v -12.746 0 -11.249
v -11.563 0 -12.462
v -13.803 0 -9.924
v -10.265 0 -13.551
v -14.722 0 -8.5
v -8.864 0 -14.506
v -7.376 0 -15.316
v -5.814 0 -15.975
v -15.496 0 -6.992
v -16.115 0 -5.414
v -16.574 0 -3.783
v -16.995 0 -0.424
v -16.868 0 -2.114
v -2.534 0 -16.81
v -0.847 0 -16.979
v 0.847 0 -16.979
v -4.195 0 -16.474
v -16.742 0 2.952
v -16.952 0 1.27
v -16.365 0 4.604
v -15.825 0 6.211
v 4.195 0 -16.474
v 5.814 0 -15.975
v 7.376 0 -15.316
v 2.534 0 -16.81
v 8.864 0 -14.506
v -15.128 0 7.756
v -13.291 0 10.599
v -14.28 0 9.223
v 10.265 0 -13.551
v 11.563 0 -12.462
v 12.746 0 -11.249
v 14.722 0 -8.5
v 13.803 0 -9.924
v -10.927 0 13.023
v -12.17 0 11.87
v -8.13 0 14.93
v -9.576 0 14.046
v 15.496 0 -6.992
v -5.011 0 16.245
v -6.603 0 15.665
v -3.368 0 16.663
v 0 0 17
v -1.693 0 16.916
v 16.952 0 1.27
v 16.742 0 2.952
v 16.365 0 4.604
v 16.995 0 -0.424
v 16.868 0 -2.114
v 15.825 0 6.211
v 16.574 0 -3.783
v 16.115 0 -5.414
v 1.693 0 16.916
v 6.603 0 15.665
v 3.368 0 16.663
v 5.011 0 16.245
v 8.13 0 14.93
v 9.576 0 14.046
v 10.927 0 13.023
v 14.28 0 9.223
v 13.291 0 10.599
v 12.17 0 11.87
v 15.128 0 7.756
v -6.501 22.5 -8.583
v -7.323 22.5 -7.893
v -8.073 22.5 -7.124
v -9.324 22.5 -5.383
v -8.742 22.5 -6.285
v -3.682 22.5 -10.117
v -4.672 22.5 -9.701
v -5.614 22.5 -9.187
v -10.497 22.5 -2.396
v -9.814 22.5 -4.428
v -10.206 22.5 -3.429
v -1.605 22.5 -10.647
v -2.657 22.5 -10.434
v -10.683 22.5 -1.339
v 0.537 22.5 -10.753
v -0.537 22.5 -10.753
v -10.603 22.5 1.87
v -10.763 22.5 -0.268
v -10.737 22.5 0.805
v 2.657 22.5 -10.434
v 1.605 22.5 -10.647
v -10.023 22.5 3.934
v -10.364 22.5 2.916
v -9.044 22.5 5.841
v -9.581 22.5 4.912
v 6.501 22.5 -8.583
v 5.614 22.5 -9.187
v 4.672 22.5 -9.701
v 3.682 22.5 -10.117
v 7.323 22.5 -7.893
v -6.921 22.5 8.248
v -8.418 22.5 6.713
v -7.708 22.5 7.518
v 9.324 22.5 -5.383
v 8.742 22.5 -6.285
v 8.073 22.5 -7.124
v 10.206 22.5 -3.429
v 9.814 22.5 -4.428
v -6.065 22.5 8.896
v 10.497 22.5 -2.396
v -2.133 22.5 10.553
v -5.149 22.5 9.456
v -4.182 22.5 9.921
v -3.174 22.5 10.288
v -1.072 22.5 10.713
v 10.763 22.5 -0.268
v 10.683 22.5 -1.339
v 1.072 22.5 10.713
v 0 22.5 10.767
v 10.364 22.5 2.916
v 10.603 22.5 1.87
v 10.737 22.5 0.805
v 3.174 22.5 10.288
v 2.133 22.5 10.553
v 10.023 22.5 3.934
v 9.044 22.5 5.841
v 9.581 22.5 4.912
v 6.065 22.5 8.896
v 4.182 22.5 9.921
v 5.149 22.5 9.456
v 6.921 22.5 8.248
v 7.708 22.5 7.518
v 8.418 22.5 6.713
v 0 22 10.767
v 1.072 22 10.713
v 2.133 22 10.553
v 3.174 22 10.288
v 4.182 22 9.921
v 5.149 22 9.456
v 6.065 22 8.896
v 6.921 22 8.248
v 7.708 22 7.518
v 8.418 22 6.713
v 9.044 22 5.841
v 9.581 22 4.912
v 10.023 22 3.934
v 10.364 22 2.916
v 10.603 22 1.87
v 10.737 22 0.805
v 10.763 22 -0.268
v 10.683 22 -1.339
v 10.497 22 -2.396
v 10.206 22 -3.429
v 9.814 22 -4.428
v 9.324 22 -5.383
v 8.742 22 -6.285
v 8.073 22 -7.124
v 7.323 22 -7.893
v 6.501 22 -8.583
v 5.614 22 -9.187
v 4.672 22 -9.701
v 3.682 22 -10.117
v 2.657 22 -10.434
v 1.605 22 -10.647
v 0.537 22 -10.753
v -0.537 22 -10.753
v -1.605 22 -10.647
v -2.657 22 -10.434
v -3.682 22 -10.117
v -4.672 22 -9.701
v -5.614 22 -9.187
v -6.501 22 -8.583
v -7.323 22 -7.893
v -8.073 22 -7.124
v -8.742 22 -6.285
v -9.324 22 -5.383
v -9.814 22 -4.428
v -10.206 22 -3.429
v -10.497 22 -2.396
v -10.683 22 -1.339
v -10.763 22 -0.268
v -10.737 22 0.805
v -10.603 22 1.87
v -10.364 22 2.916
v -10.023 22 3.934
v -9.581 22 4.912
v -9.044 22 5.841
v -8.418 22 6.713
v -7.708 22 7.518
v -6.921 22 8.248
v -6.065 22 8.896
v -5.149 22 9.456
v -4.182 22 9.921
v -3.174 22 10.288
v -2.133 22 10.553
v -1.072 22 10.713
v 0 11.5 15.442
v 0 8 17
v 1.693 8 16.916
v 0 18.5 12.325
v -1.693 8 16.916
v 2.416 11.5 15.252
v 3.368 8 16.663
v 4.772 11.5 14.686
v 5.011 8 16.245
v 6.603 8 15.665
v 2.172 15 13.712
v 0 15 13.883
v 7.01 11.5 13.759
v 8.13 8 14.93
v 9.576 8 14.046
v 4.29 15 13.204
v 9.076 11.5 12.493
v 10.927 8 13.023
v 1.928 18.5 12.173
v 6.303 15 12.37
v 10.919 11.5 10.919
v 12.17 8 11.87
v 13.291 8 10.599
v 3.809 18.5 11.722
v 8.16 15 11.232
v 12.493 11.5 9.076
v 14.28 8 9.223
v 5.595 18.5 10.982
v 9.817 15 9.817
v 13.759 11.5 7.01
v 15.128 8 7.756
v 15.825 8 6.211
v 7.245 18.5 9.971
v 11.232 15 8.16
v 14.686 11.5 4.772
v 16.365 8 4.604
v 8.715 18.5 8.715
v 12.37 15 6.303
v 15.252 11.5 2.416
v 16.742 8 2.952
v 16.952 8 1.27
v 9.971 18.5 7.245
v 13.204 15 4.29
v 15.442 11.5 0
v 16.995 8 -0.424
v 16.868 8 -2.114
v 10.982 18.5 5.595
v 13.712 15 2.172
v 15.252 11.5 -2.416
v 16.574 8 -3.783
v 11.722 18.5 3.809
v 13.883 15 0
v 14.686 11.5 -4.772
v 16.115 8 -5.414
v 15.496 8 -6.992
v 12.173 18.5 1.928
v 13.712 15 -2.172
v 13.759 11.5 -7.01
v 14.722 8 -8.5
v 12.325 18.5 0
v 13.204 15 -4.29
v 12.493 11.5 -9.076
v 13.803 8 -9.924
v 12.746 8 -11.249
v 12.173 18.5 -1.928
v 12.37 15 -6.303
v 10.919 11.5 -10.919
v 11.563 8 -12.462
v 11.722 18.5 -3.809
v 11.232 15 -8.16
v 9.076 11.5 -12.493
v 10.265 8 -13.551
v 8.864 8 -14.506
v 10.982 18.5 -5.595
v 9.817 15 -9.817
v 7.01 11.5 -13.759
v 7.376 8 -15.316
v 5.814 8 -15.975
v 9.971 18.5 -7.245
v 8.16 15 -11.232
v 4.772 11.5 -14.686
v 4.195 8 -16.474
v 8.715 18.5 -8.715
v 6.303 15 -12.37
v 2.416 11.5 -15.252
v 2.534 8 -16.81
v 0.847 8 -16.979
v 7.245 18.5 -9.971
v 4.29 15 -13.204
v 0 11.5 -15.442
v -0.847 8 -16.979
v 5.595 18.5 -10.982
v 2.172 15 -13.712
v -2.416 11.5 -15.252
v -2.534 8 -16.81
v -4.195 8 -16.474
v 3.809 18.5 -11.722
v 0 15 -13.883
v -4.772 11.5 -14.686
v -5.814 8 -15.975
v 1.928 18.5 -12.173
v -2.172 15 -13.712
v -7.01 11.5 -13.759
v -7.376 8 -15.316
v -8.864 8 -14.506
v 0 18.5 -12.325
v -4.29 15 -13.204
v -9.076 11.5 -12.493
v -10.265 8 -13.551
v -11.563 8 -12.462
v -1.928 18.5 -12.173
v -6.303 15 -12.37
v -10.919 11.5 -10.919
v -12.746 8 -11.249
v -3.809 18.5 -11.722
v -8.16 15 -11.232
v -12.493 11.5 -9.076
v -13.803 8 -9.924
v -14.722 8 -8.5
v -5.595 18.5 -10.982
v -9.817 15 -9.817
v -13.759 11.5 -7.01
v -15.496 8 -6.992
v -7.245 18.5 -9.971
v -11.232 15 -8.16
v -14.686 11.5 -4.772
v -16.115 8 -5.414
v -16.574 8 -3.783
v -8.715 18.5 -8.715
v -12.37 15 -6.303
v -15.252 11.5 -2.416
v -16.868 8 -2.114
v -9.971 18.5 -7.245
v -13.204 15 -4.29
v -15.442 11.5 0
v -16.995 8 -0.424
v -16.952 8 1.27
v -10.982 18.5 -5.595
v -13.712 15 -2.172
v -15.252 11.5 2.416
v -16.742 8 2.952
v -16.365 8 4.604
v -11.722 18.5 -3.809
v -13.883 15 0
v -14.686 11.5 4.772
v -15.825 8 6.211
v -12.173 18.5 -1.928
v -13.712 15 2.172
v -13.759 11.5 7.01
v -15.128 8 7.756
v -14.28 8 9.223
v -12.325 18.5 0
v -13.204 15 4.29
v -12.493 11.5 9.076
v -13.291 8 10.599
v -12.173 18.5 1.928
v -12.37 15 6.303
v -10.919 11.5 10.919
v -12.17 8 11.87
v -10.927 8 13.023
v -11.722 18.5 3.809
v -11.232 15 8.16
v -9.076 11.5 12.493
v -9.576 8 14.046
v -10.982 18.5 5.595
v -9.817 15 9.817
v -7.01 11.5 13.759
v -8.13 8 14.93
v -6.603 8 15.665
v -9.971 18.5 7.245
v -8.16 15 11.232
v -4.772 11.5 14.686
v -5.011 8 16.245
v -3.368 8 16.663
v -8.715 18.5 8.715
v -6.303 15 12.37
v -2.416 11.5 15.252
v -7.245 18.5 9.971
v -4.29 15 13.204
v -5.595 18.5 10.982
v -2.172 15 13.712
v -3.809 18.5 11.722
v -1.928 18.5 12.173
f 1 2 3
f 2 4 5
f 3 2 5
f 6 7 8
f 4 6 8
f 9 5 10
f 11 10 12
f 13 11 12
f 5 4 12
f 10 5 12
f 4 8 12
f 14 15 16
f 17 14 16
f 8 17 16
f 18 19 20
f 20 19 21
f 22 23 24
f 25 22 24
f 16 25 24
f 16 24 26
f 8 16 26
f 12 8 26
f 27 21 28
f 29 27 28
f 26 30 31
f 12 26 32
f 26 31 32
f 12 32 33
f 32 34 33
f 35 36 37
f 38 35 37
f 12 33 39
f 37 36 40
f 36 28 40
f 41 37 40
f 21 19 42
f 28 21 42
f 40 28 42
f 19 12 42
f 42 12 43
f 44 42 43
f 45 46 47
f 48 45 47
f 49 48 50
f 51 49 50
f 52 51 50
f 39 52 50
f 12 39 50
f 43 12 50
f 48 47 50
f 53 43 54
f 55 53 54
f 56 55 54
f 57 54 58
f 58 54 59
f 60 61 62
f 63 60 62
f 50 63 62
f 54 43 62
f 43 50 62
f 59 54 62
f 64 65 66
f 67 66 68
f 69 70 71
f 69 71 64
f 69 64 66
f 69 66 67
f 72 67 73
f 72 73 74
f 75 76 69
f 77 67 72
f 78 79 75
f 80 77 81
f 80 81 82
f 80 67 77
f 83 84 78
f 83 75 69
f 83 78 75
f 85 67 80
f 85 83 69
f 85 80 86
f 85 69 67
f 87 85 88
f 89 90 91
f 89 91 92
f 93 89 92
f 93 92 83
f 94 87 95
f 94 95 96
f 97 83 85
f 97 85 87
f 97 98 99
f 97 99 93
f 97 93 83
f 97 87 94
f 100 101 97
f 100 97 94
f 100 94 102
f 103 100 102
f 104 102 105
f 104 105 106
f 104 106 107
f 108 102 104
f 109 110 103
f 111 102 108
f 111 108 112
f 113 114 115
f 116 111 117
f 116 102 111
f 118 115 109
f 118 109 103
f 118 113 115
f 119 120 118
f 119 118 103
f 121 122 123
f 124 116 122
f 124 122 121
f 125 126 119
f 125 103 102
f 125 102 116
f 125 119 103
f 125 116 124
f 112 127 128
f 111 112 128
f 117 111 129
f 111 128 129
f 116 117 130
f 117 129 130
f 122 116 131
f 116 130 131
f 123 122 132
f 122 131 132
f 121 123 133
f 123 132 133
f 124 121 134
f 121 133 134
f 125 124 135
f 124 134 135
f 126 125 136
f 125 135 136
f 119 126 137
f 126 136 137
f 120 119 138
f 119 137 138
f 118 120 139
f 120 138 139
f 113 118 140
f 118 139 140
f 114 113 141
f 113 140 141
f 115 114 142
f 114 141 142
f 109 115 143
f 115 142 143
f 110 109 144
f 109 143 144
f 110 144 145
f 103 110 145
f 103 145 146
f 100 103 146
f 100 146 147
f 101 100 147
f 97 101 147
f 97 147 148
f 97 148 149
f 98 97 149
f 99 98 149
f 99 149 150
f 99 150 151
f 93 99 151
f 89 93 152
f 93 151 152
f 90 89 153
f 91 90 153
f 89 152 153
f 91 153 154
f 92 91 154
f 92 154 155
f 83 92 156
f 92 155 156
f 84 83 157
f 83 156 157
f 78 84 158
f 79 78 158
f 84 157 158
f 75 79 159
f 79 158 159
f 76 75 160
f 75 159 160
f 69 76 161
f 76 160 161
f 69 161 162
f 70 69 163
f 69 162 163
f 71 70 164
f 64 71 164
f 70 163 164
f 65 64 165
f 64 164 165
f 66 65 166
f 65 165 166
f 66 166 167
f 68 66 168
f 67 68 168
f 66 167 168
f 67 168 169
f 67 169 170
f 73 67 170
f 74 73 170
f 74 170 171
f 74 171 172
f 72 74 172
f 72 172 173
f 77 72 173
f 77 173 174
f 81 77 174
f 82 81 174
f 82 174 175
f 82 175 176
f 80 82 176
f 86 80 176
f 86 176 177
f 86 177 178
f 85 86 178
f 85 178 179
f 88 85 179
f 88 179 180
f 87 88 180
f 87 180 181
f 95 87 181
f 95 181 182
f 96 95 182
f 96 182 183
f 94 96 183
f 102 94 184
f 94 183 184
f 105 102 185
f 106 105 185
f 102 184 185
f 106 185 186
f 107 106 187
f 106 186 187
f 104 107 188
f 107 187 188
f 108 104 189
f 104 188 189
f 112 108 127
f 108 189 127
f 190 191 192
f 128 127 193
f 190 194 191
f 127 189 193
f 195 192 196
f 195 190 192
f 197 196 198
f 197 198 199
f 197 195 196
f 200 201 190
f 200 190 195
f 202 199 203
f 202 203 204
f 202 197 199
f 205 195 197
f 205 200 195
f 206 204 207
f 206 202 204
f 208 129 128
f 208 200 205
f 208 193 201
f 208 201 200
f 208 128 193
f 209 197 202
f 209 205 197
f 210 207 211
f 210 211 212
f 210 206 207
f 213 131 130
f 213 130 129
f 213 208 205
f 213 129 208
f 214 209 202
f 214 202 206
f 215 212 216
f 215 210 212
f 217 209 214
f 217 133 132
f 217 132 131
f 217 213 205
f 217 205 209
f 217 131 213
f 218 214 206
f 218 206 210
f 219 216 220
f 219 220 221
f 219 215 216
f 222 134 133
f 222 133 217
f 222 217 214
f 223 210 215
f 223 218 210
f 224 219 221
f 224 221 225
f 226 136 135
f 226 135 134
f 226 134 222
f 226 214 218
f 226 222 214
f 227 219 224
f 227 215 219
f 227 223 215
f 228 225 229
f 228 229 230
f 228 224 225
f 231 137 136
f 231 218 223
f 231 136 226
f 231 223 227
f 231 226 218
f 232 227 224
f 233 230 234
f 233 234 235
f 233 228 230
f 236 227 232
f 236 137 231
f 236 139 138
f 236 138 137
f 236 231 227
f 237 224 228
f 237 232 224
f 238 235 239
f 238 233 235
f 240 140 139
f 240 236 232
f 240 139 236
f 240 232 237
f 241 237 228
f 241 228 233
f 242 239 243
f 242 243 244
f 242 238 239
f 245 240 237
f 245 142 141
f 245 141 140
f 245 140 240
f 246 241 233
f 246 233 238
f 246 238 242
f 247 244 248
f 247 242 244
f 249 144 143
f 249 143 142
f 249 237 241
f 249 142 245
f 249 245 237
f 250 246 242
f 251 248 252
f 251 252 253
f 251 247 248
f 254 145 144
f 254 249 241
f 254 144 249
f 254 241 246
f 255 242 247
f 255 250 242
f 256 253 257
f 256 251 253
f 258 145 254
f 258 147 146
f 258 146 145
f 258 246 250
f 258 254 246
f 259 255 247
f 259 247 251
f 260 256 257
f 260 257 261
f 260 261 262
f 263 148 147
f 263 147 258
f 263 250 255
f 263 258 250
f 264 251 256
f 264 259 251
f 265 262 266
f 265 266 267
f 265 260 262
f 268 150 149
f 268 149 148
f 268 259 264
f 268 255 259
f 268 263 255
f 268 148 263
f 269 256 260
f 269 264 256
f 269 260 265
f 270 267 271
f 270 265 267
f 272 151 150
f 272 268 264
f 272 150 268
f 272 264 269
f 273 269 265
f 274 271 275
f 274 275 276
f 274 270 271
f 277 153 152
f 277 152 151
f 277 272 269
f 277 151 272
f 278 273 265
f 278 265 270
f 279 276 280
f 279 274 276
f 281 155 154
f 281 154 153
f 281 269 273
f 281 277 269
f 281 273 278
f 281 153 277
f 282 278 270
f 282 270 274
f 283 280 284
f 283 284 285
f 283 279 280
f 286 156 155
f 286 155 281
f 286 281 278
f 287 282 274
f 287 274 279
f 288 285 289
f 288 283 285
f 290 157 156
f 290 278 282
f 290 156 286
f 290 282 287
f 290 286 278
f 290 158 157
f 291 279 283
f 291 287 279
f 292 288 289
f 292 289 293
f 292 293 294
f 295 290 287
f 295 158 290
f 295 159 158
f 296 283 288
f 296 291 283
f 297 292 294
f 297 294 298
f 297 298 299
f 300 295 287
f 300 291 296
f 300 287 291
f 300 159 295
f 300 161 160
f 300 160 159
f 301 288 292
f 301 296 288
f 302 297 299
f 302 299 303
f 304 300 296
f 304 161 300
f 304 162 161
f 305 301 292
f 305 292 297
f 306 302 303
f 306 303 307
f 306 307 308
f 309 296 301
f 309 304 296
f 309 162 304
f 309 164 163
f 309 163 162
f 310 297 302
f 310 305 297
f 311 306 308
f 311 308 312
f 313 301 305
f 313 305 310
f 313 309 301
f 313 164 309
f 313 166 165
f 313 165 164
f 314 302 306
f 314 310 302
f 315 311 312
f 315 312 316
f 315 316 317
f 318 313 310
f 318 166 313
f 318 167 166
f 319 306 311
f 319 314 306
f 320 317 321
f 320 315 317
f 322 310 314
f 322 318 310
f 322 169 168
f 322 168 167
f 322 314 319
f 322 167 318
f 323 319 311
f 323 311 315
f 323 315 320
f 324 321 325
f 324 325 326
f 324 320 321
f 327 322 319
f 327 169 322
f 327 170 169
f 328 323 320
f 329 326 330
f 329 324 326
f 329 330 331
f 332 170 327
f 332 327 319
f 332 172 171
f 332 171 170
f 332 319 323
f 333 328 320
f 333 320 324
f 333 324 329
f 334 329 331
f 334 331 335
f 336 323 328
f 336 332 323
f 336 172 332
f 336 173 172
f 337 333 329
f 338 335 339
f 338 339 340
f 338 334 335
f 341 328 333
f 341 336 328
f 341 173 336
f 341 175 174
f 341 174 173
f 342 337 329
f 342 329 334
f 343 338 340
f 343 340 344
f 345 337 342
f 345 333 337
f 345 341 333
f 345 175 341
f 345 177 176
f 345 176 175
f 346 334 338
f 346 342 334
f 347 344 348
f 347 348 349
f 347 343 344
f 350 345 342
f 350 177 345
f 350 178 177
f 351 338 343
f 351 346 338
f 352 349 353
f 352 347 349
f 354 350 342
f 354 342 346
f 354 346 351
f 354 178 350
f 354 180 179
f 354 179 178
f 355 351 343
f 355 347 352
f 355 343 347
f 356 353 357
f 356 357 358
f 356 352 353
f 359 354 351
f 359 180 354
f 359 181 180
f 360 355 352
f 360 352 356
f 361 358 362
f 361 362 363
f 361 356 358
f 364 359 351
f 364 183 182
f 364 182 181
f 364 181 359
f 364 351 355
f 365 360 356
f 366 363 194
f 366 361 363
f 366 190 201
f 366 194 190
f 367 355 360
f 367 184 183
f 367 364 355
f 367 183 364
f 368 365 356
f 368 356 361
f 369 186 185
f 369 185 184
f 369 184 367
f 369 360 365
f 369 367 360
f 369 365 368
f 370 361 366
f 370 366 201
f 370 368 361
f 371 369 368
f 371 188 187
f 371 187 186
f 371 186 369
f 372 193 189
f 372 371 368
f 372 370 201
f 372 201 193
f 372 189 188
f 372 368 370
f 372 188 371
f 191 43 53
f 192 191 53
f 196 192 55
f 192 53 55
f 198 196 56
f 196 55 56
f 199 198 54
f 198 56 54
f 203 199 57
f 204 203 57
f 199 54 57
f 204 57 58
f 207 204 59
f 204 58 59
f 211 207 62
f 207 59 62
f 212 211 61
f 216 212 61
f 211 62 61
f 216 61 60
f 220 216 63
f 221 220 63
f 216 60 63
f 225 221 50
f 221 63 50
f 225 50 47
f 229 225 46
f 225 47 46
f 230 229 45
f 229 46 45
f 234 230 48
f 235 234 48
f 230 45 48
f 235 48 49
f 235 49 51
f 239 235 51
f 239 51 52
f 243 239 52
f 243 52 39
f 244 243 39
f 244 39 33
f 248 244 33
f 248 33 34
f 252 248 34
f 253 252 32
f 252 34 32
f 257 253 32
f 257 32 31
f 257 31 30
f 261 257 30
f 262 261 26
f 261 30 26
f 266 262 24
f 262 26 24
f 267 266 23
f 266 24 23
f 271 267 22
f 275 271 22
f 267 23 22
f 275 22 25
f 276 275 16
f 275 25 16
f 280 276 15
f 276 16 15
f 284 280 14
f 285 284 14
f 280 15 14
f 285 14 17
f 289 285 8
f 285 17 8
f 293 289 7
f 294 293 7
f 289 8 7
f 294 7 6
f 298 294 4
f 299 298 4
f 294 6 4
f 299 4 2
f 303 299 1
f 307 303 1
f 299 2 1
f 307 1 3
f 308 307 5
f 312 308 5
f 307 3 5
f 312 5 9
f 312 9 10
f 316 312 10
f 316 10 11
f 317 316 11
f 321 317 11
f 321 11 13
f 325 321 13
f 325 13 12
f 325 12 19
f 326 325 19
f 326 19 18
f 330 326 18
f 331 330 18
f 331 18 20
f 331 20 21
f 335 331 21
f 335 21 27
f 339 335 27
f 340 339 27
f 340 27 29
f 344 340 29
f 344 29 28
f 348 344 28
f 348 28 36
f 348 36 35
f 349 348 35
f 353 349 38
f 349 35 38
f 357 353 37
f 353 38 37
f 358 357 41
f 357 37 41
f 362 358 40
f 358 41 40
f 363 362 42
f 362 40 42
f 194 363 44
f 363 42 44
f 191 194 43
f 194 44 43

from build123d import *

# Parameters (mm, degrees)
SKETCH_1_R      = 17
EXTRUDE_1_DEPTH = 8
SKETCH_2_R      = 17
EXTRUDE_2_DEPTH = 14
EXTRUDE_2_TAPER = 24
SKETCH_4_R      = 10.766798406
EXTRUDE_3_DEPTH = 0.5


with BuildPart() as part:
    # 草图1 → 凸台-拉伸1 (new body)
    with BuildSketch(Plane(origin=(0, 0, 0), x_dir=(1, 0, 0), z_dir=(0, 1, 0))):
        with Locations(Location((0, 0, 0), (0, 0, 270))):
            Circle(SKETCH_1_R)
    extrude(amount=EXTRUDE_1_DEPTH)

    # 草图2 → 凸台-拉伸2 (add)
    with BuildSketch(Plane(origin=(0, 8, 0), x_dir=(1, 0, 0), z_dir=(0, 1, 0))):
        with Locations(Location((0, 0, 0), (0, 0, 270))):
            Circle(SKETCH_2_R)
    extrude(amount=EXTRUDE_2_DEPTH, taper=EXTRUDE_2_TAPER)

    # 草图4 → 凸台-拉伸3 (add)
    with BuildSketch(Plane(origin=(0, 22, 0), x_dir=(1, 0, 0), z_dir=(0, 1, 0))):
        with Locations(Location((0, 0, 0), (0, 0, 270))):
            Circle(SKETCH_4_R)
    extrude(amount=EXTRUDE_3_DEPTH)


solid = part.part
